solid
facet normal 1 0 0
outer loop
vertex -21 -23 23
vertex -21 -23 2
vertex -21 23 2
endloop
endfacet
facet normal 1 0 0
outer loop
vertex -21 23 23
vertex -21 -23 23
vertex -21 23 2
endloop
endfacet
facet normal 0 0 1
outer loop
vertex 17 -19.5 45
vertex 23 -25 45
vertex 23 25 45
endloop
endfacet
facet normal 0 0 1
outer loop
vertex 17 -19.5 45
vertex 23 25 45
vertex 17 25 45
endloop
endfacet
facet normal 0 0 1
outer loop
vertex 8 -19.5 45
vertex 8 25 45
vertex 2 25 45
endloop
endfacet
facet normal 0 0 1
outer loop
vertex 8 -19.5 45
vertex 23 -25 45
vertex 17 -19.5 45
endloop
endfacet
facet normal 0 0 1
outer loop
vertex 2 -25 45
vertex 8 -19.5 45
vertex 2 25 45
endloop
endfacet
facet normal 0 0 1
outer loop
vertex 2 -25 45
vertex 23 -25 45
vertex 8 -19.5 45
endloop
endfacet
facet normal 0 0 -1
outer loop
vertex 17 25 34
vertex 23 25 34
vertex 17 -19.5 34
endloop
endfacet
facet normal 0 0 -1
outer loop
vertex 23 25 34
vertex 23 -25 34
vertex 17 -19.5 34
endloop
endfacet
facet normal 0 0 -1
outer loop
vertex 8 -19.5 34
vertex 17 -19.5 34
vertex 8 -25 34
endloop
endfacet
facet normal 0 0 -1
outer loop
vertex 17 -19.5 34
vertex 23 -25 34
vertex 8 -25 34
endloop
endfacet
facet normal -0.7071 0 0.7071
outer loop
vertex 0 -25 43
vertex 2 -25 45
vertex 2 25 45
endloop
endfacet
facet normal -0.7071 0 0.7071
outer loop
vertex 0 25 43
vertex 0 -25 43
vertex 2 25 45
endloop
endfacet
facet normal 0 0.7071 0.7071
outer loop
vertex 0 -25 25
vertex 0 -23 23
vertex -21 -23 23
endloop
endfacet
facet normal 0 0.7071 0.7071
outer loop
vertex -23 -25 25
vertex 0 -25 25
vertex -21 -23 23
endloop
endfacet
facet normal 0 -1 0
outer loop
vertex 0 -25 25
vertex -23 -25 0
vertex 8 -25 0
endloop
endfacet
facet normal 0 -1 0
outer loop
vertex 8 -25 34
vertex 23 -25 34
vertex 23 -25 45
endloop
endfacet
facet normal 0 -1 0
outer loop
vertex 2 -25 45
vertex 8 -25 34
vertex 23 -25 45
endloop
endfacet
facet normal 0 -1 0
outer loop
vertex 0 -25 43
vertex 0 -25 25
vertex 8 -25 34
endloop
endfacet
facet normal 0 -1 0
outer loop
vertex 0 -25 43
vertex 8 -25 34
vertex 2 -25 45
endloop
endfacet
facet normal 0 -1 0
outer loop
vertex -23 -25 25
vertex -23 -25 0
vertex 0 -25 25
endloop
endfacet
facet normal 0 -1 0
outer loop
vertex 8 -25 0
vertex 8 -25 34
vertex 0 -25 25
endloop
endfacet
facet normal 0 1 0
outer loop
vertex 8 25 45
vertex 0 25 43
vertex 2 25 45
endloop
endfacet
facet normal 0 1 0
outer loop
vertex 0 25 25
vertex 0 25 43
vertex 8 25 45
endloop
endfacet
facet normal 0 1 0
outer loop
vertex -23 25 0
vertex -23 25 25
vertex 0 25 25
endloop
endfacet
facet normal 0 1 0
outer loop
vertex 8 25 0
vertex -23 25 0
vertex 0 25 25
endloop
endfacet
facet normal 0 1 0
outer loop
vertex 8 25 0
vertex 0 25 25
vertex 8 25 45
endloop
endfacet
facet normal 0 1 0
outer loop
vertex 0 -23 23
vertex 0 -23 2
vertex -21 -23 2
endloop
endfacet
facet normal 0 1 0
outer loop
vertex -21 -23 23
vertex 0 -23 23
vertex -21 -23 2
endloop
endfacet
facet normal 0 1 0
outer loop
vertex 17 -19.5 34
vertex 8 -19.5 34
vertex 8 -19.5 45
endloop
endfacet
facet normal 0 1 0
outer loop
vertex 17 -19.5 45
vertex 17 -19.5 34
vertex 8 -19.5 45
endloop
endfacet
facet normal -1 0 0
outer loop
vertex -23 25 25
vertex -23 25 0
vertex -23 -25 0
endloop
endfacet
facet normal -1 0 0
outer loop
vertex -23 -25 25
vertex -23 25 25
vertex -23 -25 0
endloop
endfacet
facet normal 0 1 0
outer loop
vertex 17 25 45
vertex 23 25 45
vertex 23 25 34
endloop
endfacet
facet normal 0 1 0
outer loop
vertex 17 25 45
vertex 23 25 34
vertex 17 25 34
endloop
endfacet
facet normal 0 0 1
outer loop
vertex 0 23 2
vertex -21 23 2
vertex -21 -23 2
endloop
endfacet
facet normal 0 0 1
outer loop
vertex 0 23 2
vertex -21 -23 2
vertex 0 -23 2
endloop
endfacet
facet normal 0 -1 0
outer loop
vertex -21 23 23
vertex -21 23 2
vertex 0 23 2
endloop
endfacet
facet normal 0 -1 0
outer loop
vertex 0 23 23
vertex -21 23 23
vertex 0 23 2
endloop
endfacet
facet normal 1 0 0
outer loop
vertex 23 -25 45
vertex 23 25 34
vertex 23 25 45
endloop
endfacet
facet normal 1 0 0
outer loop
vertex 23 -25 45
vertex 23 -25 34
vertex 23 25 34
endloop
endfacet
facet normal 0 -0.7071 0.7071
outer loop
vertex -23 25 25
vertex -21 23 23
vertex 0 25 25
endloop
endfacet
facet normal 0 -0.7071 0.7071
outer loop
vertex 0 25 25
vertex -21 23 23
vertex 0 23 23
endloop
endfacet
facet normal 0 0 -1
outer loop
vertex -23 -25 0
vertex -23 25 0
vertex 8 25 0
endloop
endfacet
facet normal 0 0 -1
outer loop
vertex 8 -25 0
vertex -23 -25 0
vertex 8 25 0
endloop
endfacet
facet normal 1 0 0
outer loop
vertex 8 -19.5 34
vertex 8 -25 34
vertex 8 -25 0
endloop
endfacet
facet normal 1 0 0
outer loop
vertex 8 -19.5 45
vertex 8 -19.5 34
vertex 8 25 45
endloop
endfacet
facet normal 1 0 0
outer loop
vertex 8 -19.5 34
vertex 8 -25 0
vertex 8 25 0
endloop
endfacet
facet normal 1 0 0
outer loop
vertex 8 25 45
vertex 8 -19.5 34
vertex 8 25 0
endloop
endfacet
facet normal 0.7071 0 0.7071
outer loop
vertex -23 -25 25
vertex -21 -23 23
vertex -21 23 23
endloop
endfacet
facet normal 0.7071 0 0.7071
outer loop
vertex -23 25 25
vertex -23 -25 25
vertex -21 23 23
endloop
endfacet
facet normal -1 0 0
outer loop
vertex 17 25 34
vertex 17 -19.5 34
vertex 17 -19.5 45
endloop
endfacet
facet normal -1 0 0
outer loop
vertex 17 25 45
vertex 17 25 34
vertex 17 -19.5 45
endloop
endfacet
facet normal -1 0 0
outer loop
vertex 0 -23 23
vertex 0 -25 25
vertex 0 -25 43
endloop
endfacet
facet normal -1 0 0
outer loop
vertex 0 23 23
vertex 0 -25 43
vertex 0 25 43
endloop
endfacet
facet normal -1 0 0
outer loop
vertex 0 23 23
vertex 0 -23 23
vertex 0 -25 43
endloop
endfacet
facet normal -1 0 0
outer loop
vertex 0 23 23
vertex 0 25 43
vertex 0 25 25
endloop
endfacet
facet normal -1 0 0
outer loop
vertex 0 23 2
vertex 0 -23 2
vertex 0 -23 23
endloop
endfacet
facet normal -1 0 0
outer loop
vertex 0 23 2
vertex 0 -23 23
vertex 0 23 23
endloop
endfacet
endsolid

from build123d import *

# Parameters (mm, degrees)
F1_DEPTH = 25
F0_W     = 21
F0_H     = 46
F2_DEPTH = 2
F3_W     = 8
F3_H     = 50
F4_DEPTH = 20
F5_W     = 5.5
F5_H     = 11
F6_DEPTH = 15
F7_W     = 6
F7_H     = 11
F8_DEPTH = 44.5
F9_SIZE  = 1.99999


# Not quite as in the source:
# - a fillet or chamfer is up to 0.001 mm smaller than in the source, because OpenCascade refuses the exact size


with BuildPart() as f1:
    # F0 (on Top) → F1 (new body)
    with BuildSketch(Plane.XY):
        Polygon((0, 25), (0, 23), (0, -23), (0, -25), (8, -25), (8, 25), align=None)
        Polygon((-21, 23), (0, 23), (0, 25), (-23, 25), (-23, -25), (0, -25), (0, -23), (-21, -23), align=None)
    extrude(amount=F1_DEPTH)

    # F0 (on Top) → F2 (join)
    with BuildSketch(Plane.XY):
        Polygon((0, 25), (0, 23), (0, -23), (0, -25), (8, -25), (8, 25), align=None)
        with Locations((-10.5, 0)):
            Rectangle(F0_W, F0_H)
        Polygon((-21, 23), (0, 23), (0, 25), (-23, 25), (-23, -25), (0, -25), (0, -23), (-21, -23), align=None)
    extrude(amount=F2_DEPTH)

    # F3 (on face) → F4 (join)
    with BuildSketch(Plane.XY.offset(25)):
        with Locations((4, 0)):
            Rectangle(F3_W, F3_H)
    extrude(amount=F4_DEPTH)

    # F5 (on face) → F6 (join)
    with BuildSketch(Plane.YZ.offset(8)):
        with Locations((-22.25, 39.5)):
            Rectangle(F5_W, F5_H)
    extrude(amount=F6_DEPTH)

    # F7 (on face) → F8 (join, through all)
    with BuildSketch(Plane(origin=(0, -19.5, 0), x_dir=(-1, 0, 0), z_dir=(0, 1, 0))):
        with Locations((-20, 39.5)):
            Rectangle(F7_W, F7_H)
    extrude(amount=F8_DEPTH)

    # F9 (size 2 in the source; OpenCascade refuses exactly that, so slightly less here)
    f9_edges = [f1.edges().sort_by_distance(p)[0] for p in [
        (-10.5, 23, 25),
        (-21, 0, 25),
        (-10.5, -23, 25),
        (0, 0, 45),
    ]]
    chamfer(f9_edges, length=F9_SIZE)


solid = f1.part
